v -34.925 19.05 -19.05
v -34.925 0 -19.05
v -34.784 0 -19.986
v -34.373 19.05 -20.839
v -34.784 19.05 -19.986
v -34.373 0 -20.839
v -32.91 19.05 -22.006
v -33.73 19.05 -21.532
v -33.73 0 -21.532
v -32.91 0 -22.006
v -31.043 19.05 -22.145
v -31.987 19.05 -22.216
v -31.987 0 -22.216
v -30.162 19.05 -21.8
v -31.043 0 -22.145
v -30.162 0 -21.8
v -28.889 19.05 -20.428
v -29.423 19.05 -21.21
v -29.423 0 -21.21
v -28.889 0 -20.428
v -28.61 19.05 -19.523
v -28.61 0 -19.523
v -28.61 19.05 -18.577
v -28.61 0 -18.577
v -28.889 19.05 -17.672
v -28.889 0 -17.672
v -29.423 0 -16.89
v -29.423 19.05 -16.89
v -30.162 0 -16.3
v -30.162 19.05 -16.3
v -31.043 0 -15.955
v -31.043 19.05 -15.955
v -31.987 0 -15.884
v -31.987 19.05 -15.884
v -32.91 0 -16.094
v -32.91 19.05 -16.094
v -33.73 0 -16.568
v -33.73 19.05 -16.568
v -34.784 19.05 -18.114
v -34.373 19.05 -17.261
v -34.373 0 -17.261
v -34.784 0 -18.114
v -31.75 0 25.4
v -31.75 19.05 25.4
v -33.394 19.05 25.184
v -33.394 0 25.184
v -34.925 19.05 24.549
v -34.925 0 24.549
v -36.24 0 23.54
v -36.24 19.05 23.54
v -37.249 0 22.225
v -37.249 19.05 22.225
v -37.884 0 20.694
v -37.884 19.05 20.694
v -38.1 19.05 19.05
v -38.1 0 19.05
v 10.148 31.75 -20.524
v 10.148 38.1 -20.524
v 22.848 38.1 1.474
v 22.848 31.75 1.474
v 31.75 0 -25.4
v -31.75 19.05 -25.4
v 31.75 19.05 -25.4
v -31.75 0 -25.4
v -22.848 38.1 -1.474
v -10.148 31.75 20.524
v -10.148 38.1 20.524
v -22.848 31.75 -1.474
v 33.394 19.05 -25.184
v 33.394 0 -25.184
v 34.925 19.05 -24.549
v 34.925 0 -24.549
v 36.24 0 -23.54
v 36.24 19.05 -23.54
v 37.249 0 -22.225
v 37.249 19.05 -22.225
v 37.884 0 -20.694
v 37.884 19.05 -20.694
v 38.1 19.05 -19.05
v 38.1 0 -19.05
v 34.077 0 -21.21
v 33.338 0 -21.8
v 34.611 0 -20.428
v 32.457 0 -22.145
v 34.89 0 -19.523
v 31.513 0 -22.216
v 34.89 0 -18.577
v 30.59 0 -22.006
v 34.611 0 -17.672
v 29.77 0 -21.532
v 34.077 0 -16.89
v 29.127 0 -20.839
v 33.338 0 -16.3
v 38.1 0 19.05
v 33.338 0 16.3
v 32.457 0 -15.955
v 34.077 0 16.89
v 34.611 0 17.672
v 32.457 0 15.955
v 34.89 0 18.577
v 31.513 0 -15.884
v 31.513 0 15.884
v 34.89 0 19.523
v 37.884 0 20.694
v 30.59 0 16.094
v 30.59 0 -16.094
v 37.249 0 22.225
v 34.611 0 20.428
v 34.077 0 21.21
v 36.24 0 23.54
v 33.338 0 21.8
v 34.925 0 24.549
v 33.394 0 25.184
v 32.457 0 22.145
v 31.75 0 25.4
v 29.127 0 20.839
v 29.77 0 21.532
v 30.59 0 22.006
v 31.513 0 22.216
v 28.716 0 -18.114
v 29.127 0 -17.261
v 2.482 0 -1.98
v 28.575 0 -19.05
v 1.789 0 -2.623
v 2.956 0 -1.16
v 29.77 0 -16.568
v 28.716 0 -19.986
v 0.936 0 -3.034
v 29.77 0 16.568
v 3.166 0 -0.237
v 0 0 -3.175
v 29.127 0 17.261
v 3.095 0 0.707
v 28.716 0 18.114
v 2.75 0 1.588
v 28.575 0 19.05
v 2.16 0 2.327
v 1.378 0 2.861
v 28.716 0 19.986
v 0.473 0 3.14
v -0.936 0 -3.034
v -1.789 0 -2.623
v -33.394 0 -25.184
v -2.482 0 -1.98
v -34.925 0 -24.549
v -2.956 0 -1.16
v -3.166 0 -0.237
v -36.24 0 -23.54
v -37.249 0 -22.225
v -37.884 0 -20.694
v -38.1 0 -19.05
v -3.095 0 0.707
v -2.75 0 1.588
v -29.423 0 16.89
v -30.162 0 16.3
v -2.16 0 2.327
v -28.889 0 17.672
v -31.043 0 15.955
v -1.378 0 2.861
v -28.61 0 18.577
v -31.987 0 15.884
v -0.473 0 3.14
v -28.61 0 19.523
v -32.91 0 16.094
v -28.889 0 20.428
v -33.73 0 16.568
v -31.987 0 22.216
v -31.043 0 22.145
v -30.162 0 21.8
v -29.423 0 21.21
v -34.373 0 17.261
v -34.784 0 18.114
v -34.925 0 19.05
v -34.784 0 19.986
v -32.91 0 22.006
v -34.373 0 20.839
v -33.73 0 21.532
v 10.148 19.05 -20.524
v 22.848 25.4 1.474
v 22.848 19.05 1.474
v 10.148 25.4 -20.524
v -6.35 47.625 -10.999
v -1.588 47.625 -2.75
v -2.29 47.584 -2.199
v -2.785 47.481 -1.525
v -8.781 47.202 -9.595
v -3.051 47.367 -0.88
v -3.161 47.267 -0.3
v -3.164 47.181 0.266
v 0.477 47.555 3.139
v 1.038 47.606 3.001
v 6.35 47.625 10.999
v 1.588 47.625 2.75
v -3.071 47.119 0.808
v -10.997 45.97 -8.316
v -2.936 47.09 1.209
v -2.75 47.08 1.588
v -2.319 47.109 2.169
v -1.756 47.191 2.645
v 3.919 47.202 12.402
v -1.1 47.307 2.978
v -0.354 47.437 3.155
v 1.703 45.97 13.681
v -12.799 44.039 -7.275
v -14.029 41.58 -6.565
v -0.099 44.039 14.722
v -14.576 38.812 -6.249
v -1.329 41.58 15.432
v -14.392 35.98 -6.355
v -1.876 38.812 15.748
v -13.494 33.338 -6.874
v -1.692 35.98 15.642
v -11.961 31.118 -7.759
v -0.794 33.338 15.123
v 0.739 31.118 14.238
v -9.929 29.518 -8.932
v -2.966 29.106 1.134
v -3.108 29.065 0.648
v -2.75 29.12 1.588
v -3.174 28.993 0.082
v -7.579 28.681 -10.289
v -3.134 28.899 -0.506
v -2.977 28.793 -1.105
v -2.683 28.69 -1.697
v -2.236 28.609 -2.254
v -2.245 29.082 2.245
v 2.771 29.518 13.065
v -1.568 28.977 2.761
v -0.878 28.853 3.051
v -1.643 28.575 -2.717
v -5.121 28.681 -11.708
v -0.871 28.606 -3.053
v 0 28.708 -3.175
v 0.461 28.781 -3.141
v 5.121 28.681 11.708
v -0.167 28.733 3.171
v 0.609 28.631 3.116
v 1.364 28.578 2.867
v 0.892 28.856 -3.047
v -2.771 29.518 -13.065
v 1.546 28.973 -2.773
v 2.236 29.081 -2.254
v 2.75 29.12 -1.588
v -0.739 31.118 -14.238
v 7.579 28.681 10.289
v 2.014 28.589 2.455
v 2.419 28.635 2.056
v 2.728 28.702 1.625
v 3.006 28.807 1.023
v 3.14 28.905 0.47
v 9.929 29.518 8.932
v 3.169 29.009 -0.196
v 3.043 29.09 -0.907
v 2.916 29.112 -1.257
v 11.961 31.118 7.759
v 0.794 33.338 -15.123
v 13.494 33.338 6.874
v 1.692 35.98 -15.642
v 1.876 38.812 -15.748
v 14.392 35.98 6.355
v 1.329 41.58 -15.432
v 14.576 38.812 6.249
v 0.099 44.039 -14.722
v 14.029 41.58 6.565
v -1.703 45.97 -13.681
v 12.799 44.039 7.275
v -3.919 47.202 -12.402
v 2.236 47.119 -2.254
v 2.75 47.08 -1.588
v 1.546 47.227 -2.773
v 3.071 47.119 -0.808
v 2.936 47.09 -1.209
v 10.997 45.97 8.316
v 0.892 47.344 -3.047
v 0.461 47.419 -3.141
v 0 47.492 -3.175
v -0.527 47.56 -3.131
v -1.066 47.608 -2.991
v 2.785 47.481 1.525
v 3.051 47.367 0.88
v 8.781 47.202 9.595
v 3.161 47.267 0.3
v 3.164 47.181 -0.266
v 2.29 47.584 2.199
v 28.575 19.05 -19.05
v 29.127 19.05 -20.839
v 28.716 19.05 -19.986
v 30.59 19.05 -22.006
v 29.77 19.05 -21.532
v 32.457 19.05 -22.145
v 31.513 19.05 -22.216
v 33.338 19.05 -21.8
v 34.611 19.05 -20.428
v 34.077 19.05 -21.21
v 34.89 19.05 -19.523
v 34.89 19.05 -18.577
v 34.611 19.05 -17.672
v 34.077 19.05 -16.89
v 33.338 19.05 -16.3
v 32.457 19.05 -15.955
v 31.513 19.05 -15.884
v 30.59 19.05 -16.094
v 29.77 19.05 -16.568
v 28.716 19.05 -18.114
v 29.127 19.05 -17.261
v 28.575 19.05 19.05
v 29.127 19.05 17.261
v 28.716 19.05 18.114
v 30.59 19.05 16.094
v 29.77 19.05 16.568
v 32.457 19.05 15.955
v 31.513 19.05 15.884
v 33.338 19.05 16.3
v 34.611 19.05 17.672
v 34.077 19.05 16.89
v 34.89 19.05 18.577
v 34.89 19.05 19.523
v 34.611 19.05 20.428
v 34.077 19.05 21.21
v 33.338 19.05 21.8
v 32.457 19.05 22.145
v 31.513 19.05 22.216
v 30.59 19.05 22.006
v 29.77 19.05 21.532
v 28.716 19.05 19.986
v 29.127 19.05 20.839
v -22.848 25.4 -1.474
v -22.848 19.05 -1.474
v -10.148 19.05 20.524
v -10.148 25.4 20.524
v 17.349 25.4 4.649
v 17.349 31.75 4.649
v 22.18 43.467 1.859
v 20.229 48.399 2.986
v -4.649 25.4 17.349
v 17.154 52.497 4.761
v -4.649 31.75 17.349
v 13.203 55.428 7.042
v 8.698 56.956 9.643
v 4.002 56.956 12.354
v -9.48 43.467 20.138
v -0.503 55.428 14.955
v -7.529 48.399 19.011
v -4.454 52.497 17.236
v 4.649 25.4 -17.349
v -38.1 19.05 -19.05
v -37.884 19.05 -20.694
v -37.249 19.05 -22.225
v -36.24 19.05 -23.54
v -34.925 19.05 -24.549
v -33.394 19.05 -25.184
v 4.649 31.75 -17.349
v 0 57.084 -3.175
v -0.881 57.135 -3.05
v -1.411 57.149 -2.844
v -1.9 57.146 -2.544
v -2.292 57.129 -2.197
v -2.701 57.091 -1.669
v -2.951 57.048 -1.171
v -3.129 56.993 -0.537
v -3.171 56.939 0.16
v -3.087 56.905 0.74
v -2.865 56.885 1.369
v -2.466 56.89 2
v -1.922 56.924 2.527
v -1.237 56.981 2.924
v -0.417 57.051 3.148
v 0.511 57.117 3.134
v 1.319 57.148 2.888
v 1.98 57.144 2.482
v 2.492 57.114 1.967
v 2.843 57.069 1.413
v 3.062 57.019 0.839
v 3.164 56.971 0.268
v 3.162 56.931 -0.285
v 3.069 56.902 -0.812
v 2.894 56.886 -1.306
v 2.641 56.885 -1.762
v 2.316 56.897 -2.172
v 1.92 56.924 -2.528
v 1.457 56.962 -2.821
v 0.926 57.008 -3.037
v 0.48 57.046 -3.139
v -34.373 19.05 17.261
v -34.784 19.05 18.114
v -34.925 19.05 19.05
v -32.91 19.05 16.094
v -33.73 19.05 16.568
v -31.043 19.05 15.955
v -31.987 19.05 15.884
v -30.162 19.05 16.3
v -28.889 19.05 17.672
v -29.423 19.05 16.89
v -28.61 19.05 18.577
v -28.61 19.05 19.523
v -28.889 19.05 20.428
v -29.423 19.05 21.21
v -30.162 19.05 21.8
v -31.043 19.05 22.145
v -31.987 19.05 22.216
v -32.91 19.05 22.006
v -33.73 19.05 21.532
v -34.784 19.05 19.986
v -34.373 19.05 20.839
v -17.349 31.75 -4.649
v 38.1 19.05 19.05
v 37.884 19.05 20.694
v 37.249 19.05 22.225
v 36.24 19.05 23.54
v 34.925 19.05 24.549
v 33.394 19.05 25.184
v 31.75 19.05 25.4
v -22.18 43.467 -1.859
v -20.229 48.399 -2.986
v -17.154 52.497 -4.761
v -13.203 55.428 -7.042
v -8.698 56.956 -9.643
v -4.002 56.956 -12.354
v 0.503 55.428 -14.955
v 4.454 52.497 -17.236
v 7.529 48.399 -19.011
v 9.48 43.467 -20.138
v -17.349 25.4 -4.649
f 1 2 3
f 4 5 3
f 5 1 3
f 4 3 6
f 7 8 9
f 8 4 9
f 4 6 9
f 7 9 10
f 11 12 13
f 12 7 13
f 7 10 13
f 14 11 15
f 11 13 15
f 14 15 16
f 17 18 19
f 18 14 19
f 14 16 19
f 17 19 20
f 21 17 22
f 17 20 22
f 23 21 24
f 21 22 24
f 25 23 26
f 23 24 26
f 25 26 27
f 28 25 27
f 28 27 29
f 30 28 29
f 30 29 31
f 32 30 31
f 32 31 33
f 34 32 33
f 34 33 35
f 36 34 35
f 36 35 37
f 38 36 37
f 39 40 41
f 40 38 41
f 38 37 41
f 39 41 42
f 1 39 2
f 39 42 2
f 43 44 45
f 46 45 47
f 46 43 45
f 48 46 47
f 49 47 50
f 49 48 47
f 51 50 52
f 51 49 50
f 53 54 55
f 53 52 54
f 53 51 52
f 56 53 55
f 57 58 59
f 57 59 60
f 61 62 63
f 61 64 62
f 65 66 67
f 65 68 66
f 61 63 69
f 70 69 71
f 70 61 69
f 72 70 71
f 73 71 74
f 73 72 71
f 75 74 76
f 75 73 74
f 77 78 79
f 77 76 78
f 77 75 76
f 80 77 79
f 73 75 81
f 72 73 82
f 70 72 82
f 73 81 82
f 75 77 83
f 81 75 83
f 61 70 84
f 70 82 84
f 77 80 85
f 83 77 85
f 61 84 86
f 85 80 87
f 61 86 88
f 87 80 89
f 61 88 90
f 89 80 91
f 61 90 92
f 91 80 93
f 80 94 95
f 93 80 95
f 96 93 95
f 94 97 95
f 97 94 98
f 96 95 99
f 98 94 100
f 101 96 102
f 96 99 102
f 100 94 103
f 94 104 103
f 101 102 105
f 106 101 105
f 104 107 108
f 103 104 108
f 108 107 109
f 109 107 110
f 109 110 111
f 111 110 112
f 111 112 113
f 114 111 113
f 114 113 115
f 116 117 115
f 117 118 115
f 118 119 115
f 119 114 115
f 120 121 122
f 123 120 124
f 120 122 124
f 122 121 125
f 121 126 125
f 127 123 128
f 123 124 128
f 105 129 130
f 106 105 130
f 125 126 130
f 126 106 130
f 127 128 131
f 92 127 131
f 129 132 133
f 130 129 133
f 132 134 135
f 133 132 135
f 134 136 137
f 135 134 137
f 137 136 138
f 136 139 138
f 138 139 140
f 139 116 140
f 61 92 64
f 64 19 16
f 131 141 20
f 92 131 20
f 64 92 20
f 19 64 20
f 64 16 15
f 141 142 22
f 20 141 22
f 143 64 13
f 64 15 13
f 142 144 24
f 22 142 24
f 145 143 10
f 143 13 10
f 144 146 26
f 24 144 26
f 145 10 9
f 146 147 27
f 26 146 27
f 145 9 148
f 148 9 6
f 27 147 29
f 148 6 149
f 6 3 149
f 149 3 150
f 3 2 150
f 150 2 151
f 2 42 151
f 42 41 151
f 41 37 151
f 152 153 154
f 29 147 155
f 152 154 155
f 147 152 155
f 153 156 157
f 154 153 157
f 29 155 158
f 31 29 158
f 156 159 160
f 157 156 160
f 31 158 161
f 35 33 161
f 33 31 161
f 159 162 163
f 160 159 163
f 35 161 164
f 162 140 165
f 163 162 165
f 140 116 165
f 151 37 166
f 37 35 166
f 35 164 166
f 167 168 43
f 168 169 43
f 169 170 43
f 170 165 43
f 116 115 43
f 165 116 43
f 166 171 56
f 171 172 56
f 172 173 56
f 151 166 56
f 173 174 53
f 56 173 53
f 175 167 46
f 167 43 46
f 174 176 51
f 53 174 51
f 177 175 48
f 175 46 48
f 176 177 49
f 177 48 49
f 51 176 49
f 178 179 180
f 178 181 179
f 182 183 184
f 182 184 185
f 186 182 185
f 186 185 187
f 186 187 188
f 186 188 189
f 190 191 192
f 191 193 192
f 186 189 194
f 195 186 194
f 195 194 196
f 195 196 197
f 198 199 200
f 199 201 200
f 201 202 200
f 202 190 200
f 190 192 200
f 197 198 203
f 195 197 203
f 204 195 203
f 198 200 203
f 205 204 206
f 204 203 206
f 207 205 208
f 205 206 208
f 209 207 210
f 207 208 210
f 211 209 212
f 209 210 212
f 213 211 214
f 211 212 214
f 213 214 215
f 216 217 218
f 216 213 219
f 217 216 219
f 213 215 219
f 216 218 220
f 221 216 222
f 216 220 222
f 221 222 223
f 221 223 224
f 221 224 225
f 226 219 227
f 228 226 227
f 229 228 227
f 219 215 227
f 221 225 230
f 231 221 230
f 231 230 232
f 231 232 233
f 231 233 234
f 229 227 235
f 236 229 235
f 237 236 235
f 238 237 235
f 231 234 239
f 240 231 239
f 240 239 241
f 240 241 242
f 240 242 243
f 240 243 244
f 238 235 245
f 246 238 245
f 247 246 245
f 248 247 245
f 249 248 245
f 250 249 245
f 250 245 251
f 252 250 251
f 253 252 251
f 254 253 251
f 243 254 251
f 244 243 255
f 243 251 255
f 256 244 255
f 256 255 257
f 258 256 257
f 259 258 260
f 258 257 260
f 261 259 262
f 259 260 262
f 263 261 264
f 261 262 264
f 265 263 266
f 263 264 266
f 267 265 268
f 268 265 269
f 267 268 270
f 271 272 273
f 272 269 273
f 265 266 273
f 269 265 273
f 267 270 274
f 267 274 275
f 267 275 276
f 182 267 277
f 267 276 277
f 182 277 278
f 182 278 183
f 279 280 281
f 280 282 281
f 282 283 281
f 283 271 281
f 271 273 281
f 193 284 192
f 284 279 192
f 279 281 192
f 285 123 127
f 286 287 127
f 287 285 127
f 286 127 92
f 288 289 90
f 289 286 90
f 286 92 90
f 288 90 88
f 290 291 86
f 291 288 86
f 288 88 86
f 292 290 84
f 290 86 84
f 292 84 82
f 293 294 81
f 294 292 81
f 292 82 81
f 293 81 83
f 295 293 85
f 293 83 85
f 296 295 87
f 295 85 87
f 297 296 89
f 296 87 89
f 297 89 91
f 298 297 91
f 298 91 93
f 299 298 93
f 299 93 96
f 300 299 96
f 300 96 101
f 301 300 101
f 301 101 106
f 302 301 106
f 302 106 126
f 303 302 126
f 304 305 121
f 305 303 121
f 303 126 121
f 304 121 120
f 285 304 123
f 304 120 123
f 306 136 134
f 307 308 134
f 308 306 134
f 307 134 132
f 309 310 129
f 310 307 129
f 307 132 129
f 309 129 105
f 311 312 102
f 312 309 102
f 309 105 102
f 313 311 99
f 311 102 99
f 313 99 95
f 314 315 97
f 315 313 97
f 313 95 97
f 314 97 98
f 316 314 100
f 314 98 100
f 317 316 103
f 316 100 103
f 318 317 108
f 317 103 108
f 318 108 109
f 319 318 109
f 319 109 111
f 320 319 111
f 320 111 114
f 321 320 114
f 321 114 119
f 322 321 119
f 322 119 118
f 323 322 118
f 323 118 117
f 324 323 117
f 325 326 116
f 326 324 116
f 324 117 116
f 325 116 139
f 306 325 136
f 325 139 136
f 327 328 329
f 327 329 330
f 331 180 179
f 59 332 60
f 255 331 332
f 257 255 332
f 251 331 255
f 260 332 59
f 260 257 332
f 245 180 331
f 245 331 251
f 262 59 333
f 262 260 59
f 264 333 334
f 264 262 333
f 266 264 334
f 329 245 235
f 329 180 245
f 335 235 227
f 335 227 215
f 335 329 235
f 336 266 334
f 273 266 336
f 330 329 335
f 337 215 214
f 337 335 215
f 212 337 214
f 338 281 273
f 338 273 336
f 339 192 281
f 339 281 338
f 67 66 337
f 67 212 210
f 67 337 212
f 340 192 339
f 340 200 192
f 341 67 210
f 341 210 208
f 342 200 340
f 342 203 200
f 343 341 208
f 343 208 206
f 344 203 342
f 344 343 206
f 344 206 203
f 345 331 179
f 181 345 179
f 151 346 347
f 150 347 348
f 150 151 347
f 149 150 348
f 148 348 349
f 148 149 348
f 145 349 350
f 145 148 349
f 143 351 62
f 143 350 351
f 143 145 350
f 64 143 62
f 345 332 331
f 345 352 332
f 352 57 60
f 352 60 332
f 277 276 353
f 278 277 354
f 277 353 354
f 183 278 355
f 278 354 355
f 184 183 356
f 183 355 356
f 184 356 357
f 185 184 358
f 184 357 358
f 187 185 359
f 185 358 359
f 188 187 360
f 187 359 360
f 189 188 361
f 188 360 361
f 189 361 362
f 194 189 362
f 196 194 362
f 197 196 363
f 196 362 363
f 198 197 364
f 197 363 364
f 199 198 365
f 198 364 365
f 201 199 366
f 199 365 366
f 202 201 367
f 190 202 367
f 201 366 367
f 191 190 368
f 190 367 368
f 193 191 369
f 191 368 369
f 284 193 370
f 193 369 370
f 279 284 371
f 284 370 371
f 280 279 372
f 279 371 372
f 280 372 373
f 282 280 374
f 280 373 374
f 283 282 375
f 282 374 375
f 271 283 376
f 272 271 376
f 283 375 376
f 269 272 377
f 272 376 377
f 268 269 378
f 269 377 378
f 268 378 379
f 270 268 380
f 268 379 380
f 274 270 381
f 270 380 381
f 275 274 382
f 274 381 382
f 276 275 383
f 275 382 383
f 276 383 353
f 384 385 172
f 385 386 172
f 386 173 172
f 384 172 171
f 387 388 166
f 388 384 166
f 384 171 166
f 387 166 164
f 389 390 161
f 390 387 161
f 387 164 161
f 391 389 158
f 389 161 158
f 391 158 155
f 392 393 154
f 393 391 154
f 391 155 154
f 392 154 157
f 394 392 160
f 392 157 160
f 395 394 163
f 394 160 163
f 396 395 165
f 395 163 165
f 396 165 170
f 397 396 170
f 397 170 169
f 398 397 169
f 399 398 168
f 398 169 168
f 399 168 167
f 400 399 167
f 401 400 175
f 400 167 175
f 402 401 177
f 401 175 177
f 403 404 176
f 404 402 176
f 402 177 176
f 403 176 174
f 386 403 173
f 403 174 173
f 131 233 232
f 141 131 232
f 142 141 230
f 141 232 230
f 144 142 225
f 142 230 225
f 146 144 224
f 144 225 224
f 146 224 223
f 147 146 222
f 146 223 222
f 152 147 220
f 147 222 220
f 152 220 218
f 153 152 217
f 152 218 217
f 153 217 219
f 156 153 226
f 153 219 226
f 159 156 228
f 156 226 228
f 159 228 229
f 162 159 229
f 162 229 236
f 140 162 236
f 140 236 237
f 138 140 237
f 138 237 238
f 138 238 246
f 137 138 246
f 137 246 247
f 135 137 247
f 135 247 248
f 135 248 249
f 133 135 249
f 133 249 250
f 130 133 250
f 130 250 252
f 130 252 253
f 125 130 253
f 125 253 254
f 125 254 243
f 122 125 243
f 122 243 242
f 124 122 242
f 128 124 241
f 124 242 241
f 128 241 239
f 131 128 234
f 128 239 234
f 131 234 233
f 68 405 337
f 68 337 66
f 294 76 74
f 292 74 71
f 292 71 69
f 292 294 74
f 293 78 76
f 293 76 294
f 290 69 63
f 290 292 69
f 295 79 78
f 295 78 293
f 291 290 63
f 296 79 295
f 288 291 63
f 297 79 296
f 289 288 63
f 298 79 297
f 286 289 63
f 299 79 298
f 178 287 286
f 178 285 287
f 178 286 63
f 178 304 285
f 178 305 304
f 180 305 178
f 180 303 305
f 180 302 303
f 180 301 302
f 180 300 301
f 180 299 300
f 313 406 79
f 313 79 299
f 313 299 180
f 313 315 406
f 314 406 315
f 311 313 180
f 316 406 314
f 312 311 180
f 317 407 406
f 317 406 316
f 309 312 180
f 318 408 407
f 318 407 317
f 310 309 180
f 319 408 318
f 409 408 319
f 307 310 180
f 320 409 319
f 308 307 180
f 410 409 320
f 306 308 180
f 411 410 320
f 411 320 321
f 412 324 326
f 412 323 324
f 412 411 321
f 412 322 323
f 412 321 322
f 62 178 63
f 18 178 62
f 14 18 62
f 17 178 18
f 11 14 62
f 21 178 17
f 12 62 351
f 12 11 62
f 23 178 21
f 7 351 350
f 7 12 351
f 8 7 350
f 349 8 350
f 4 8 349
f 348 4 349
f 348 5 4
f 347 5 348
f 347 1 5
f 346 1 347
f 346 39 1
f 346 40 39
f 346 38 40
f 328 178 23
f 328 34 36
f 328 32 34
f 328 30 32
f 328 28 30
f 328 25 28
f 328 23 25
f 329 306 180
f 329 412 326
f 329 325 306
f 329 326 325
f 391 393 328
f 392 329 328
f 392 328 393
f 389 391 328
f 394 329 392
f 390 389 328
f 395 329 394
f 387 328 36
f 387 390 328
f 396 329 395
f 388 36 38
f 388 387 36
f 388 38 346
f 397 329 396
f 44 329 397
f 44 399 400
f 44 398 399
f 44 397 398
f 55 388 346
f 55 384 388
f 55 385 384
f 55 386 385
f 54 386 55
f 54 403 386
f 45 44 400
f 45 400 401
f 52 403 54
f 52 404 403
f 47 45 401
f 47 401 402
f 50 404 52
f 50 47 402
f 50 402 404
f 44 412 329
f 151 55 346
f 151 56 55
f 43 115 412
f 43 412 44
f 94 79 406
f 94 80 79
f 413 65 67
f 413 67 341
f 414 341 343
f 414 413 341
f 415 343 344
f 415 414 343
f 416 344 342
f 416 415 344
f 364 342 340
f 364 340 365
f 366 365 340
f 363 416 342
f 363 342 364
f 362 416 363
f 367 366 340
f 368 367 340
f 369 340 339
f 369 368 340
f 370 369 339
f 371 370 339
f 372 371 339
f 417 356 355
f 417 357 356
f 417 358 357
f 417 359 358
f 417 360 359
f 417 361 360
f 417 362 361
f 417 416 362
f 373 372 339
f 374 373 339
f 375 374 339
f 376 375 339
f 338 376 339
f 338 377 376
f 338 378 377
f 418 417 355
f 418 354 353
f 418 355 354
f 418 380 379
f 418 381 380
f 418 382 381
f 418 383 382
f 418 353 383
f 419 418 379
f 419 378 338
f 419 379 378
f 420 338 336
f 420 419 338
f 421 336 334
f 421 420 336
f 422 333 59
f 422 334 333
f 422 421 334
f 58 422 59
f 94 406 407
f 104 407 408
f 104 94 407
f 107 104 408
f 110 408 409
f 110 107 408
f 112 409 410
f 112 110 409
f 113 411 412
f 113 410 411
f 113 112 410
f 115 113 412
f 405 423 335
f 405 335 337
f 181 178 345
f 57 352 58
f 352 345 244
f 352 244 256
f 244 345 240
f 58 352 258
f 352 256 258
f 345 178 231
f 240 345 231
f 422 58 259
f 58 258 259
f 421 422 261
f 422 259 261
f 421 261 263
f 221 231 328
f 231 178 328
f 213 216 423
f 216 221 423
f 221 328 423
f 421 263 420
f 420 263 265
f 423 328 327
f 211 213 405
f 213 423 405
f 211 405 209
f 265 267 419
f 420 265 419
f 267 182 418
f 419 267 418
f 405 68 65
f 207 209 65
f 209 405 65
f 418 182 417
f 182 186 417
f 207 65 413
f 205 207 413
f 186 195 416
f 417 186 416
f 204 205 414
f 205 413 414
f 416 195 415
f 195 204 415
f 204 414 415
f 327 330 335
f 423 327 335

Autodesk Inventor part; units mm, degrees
sketch "Sketch1" plane through (0, 0, 0) normal (0, 1, 0) x (-1, 0, 0)
  line L0 (31.75, -25.4) -> (-31.75, -25.4)
  line L1 (-38.1, -19.05) -> (-38.1, 19.05)
  line L2 (-31.75, 25.4) -> (31.75, 25.4)
  line L3 (38.1, 19.05) -> (38.1, -19.05)
  arc A0 (38.1, 19.05) -> (31.75, 25.4) centre (31.75, 19.05) ccw
  arc A1 (31.75, -25.4) -> (38.1, -19.05) centre (31.75, -19.05) ccw
  arc A2 (-38.1, -19.05) -> (-31.75, -25.4) centre (-31.75, -19.05) ccw
  arc A3 (-31.75, 25.4) -> (-38.1, 19.05) centre (-31.75, 19.05) ccw
  circle A4 centre (31.75, -19.05) radius 3.175
  circle A5 centre (-31.75, -19.05) radius 3.175
  circle A6 centre (-31.75, 19.05) radius 3.175
  circle A7 centre (31.75, 19.05) radius 3.175
  line L4 (0, 25.4) -> (0, -25.4) construction
  line L5 (38.1, 0) -> (-38.1, 0) construction
  point P0 (0, 0)
  point P1 (0, 0)
  dimension "d0" = 6.35
  dimension "d1" = 6.35
  dimension "d2" = 76.2
  dimension "d3" = 50.8
  dimension "d4" = 38.1
  dimension "d5" = 25.4
extrude "MAIN BODY" add sketch "Sketch1" along normal blind 19.05
ref_plane "WP1" through (0, 0, 0) normal (0.5, 0, 0.866) x (0, 1, 0)
sketch "Sketch2" plane through (0, 0, 0) normal (0.5, 0, 0.866) x (0, 1, 0)
  line L0 (19.05, -40.1963) -> (19.05, 14.7963) construction
  line L1 (19.05, 19.05) -> (25.4, 19.05)
  line L2 (25.4, 19.05) -> (25.4, 12.7)
  line L3 (25.4, 12.7) -> (31.75, 12.7)
  line L4 (31.75, 12.7) -> (31.75, 19.05)
  line L5 (31.75, 19.05) -> (38.1, 19.05)
  line L6 (38.1, 19.05) -> (38.1, -19.05)
  line L7 (38.1, -19.05) -> (31.75, -19.05)
  line L8 (31.75, -19.05) -> (31.75, -12.7)
  line L9 (31.75, -12.7) -> (25.4, -12.7)
  line L10 (25.4, -12.7) -> (25.4, -19.05)
  line L11 (25.4, -19.05) -> (19.05, -19.05)
  line L12 (19.05, -19.05) -> (19.05, 19.05)
  arc A0 (38.1, -19.05) -> (38.1, 19.05) centre (38.1, 0) ccw
  circle A1 centre (38.1, 0) radius 9.525
  point P0 (0, 0)
  dimension "d9" = 19.05
  dimension "d10" = 6.35
  dimension "d11" = 6.35
  dimension "d13" = 6.35
  dimension "d14" = 6.35
  dimension "d15" = 38.1
  dimension "d17" = 19.05
  dimension "d18" = 6.35
  dimension "d19" = 6.35
  dimension "d20" = 19.05
extrude "TOP BOSS" add sketch "Sketch2" along normal mid plane 25.4 contours L1 L2 L3 L4 L5 L6 A1 L7 L8 L9 L10 L11 L12 | A0 L6 A1
sketch "Sketch6" plane through (0, 0, 0) normal (0, -1, 0) x (1, 0, 0)
  point P0 (0, 0)
  point P1 (0, 0)
hole "THROUGH HOLE" at (0, 0, 0) direction (0, 1, 0) diameter 6.35 end through all
equation "\"d11\" = d10"
equation "\"d13\" = d10"
equation "\"d14\" = d11"
equation "\"d17\" = 0.5 * d15"
equation "\"d18\" = d10"
equation "\"d19\" = d18"
properties part number "ANS9-TUT-BK" material "LCP Plastic"
